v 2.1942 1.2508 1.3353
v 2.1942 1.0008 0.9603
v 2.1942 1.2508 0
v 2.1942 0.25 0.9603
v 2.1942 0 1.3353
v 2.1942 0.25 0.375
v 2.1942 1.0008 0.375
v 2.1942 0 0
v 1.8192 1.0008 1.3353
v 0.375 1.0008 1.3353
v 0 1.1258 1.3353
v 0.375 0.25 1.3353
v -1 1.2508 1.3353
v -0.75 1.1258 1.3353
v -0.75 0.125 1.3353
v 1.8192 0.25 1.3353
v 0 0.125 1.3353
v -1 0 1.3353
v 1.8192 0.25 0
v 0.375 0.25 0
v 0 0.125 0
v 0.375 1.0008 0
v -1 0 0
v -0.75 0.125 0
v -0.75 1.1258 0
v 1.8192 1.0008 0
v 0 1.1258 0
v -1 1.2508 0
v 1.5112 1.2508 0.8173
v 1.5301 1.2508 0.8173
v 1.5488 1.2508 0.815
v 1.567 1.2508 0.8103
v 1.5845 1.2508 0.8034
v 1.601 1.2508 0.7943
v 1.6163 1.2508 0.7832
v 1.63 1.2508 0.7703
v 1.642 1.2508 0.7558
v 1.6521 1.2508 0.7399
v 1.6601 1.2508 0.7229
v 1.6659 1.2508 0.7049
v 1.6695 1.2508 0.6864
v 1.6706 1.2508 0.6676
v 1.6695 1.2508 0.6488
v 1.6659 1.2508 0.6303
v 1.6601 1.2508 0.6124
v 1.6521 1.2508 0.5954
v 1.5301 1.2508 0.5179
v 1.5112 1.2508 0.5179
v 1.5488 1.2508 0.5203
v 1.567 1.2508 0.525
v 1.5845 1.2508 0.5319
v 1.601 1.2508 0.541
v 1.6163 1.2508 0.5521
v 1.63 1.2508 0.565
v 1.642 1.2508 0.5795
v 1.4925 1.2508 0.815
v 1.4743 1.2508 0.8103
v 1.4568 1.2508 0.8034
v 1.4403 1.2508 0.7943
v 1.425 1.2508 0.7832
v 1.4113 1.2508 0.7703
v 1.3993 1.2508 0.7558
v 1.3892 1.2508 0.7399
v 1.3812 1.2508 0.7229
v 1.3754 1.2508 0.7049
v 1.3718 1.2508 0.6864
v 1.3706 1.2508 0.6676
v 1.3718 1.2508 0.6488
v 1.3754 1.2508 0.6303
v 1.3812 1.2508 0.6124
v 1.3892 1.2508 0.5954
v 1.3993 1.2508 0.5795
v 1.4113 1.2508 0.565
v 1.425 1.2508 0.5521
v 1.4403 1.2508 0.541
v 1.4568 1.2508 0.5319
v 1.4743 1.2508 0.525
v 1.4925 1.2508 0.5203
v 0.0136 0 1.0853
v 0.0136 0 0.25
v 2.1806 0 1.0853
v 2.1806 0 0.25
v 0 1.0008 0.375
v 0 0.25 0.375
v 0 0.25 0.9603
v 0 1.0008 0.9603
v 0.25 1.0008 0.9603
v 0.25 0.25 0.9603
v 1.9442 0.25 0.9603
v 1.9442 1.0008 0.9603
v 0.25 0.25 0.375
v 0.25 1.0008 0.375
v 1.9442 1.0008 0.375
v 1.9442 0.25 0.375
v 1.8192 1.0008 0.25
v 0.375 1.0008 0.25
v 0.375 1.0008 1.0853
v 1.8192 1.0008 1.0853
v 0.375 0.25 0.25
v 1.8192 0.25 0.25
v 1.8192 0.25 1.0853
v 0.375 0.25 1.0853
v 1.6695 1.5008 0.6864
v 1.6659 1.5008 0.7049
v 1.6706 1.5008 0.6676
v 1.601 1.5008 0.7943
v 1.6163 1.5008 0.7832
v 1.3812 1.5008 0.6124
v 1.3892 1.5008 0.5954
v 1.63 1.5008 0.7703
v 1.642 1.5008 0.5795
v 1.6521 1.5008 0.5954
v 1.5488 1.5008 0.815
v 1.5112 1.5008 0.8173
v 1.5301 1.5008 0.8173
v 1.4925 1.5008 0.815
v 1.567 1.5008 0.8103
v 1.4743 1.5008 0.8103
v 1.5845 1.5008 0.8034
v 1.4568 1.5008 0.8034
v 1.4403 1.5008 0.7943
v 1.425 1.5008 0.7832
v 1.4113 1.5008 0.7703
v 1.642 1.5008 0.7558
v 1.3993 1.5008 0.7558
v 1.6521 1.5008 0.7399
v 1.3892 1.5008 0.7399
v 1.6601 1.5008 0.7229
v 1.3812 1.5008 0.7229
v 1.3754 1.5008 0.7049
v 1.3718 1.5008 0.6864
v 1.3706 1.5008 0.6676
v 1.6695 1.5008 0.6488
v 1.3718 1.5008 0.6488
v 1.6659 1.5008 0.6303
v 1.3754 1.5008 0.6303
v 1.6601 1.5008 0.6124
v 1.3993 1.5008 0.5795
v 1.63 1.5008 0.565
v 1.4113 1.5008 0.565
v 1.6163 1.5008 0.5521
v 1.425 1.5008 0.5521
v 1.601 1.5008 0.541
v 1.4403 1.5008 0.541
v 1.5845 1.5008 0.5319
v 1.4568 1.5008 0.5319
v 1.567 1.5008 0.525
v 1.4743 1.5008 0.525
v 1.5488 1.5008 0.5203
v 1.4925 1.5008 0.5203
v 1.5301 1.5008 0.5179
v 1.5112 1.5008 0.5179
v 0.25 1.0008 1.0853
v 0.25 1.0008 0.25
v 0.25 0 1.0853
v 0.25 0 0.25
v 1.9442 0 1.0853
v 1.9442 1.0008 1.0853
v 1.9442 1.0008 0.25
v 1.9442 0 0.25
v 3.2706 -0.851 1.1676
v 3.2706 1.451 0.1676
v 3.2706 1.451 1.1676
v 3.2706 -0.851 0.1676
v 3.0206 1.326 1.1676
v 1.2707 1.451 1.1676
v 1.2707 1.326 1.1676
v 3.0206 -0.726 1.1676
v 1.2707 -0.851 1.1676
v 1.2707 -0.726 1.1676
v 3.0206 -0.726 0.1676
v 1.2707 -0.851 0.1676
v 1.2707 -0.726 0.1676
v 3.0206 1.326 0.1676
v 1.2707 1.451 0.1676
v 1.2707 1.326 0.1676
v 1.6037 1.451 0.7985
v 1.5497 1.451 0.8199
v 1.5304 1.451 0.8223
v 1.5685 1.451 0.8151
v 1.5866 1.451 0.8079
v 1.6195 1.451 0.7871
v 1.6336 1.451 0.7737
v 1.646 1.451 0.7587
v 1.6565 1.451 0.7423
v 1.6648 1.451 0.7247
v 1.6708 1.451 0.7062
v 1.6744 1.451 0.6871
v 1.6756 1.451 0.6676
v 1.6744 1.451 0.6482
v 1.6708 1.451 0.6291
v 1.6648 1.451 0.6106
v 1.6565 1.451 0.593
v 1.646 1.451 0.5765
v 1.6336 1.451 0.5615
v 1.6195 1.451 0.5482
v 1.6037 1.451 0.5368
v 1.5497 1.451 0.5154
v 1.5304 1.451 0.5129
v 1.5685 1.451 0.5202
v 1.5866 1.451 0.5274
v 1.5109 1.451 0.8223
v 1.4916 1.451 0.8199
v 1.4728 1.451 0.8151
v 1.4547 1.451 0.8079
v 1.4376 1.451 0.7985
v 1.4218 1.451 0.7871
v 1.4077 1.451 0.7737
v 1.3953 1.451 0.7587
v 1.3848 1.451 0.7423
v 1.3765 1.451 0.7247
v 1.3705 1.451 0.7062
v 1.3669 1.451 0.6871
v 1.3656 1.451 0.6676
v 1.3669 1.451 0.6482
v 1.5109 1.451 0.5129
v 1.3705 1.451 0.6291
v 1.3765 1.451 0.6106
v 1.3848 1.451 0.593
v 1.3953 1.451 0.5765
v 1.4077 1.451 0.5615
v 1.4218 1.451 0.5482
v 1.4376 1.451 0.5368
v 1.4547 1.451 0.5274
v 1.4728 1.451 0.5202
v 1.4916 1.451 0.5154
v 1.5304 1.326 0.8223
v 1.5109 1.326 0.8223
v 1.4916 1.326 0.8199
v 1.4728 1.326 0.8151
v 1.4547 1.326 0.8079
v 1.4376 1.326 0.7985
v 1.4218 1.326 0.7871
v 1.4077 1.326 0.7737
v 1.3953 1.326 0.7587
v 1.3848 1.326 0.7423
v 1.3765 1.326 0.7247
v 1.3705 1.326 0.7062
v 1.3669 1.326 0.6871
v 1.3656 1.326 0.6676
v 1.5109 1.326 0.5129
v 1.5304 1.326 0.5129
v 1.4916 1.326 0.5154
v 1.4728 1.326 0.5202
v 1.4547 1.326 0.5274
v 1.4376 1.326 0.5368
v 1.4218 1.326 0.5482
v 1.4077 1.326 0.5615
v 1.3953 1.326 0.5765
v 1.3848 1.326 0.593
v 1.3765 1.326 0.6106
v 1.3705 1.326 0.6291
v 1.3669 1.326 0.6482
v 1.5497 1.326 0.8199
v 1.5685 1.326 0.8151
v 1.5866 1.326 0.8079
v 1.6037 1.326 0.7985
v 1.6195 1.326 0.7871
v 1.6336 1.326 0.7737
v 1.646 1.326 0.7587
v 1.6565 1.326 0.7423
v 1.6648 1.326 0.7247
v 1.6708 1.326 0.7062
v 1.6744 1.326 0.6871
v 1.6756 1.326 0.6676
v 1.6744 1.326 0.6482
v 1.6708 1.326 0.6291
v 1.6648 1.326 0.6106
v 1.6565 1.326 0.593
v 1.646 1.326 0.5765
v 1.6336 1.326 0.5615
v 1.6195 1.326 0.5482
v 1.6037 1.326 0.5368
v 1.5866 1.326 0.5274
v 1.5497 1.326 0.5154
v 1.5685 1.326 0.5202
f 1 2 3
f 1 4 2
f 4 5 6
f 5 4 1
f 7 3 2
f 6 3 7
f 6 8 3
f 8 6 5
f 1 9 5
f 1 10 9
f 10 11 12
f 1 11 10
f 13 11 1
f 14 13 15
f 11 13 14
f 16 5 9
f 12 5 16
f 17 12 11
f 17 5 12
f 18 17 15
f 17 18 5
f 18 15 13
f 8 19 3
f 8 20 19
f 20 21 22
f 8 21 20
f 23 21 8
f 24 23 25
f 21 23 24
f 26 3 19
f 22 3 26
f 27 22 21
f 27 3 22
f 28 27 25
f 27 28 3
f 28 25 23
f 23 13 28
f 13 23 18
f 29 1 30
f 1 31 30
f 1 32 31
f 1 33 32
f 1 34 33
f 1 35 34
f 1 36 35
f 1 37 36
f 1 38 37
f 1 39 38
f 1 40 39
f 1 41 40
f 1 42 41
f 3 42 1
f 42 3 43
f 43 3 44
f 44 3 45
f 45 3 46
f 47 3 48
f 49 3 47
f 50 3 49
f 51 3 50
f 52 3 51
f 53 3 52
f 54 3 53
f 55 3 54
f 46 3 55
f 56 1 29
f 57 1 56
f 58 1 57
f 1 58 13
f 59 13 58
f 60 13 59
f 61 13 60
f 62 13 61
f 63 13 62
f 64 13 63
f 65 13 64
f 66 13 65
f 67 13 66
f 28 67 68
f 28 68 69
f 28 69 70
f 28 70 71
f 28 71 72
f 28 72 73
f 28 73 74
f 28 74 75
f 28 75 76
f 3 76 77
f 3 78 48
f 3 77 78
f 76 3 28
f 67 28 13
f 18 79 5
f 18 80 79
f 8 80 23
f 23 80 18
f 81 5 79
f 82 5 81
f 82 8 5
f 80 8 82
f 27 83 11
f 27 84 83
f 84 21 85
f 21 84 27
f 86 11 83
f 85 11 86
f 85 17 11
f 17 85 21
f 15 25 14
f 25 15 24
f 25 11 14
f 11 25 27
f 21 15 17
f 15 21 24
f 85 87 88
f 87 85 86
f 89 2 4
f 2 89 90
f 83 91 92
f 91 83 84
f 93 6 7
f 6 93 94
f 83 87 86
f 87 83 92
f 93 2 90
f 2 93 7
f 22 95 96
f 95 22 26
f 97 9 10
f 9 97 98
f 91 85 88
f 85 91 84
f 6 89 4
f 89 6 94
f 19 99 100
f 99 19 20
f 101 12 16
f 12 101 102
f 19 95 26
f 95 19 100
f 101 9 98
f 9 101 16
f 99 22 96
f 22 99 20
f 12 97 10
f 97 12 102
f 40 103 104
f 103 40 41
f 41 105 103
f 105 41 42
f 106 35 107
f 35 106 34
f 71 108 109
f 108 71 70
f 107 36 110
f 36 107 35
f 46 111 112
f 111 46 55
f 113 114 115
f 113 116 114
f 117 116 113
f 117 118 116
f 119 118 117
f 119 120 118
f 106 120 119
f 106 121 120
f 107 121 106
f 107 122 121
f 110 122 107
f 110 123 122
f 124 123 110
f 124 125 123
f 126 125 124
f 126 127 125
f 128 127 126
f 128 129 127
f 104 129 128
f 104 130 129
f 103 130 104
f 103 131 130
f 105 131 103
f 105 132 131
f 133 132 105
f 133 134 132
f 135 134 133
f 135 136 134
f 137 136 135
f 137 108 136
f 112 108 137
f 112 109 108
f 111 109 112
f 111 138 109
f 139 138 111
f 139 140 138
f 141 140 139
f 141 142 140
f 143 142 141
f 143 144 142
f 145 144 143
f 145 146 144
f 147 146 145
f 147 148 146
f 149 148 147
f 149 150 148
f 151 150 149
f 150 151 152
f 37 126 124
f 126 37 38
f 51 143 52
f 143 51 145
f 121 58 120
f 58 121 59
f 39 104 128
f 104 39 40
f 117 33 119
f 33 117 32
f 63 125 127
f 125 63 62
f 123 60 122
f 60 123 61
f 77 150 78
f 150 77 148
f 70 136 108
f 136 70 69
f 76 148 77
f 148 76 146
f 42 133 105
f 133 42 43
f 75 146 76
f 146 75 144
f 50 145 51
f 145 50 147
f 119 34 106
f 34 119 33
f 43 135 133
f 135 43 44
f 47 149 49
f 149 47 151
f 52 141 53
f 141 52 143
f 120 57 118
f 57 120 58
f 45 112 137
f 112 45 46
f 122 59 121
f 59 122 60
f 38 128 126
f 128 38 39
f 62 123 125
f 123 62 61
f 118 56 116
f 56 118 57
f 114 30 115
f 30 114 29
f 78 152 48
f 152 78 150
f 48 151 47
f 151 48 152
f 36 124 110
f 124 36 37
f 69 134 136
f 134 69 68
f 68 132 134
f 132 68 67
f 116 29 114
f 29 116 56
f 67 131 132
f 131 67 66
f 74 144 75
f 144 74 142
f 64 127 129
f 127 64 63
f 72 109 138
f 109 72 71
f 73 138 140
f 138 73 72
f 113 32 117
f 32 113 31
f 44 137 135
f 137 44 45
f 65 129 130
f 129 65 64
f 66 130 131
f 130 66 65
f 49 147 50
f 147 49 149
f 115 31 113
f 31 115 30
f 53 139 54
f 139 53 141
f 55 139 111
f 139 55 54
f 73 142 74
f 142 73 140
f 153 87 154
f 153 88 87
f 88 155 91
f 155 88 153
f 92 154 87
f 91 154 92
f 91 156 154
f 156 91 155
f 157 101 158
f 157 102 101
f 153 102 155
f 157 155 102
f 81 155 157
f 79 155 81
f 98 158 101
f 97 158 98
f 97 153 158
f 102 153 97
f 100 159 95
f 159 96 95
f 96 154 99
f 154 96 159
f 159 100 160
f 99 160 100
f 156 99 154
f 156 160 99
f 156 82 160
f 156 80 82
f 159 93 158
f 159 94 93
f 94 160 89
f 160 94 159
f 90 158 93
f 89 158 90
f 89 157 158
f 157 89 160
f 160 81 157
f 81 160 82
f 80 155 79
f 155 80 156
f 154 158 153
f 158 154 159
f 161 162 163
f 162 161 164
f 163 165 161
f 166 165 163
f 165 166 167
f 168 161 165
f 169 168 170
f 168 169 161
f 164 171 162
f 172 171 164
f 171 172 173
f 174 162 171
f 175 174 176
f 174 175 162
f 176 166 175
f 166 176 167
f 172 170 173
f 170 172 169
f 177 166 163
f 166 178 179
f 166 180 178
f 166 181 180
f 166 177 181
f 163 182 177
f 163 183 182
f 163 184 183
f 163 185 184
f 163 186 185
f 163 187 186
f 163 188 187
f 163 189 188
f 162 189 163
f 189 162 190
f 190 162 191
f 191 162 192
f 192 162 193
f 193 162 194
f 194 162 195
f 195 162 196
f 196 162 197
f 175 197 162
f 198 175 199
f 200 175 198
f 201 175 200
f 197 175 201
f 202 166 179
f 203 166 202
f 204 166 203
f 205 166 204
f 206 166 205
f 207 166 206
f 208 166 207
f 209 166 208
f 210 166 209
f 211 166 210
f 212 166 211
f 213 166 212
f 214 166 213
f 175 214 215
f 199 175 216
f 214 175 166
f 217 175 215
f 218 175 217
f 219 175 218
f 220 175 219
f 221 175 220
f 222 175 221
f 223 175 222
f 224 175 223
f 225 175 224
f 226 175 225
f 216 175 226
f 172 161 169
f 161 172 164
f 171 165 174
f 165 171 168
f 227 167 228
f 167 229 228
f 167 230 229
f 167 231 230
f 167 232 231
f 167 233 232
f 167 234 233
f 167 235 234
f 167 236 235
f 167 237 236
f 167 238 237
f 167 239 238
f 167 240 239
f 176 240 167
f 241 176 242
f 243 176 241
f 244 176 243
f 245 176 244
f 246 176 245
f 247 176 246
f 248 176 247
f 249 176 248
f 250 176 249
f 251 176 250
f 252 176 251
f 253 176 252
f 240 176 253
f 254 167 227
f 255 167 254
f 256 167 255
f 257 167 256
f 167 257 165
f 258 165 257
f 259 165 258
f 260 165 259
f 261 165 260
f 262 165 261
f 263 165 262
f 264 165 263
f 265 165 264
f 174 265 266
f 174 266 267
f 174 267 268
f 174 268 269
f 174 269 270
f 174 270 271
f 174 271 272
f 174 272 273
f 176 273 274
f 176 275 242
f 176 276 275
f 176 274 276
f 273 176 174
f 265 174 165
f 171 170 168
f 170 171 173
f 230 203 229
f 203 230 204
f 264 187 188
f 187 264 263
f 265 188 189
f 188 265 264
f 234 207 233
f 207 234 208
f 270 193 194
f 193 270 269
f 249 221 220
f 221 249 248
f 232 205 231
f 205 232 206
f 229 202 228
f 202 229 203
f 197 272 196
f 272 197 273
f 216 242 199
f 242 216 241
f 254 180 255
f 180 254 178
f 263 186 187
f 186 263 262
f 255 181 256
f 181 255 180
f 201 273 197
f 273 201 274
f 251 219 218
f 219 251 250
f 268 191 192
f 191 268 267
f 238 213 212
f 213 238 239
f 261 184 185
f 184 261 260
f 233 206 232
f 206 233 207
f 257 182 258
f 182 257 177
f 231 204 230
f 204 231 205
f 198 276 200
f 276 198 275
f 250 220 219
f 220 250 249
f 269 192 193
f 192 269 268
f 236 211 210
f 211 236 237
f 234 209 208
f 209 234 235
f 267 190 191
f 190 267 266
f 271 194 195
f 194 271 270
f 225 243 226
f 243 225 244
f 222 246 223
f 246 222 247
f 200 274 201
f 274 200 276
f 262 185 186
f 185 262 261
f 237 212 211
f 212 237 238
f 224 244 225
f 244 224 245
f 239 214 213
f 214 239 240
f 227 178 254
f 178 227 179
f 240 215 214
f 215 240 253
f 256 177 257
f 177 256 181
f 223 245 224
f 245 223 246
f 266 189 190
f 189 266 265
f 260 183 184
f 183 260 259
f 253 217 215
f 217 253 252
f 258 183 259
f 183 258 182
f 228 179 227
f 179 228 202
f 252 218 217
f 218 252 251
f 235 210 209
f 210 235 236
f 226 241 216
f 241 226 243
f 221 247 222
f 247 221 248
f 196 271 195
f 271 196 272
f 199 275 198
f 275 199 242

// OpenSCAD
$fn = 50;

mm2in = 0.0394;
tolerance =1*mm2in;
servoWidth=20.2*mm2in + tolerance;
servoBottomLength=43*mm2in;
servoBottomHeight=24.4*mm2in + tolerance;
servoTopHeight=16.8*mm2in + tolerance;
servoTopLength=54*mm2in+tolerance;
servoHornLocation = servoBottomLength/4;
bracketThickness = 0.25;
bracketHeight = 1;
cylinderRadius = 0.15;

module shoulderServo(){
  rotate([0,0,180])
  translate([-servoBottomLength,0,0])
  union(){
  cube([servoBottomLength,servoBottomHeight,servoWidth]);
  translate([servoBottomLength/2,servoBottomHeight+servoTopHeight/2,servoWidth/2])
  cube([servoTopLength,servoTopHeight,servoWidth],center=true);
  }
}
module shoulderServoBracket(){
  union(){
    difference(){
      translate([-1,0,0])
      cube([servoBottomLength+2*bracketThickness+1,servoBottomHeight+bracketThickness,servoWidth+2*bracketThickness]);  
      translate([-1+bracketThickness,bracketThickness/2,0])
      cube([0.75,servoBottomHeight,2]);
      translate([-0.5,bracketThickness,1.5*bracketThickness])
      cube([2*servoBottomLength,servoBottomHeight-bracketThickness,servoWidth-bracketThickness]);
      translate([1.5*bracketThickness,bracketThickness,0])
      cube([servoBottomLength - bracketThickness,servoBottomHeight-bracketThickness,2*servoWidth]);
    }
    translate([servoBottomLength*3/4 + bracketThickness,servoBottomHeight + 2*bracketThickness,servoWidth/2 + bracketThickness])
    rotate([90,0,0])
    cylinder(r=cylinderRadius,h=bracketThickness);
  }
}
module shoulderArmBracket(){
  cylinderRadius = 0.15;
  bracketLength = servoBottomHeight+servoTopHeight + 2*bracketThickness+0.10;
  //bracketLength =  2;
  bracketWidth = 2; 

  difference(){
    cube([bracketWidth,bracketLength,bracketHeight]);
    translate([0,bracketThickness/2,0])
    cube([bracketWidth-bracketThickness,bracketLength-bracketThickness,bracketHeight]);
    translate([bracketThickness,bracketLength,bracketHeight/2])
    rotate([90,0,0])
    cylinder(r=cylinderRadius+0.005,h=bracketThickness,center=true);
  }
}
module shoulderBrackets(){
difference(){
  shoulderServoBracket();
  translate([bracketThickness,servoBottomHeight,bracketThickness])
  shoulderServo();
}
translate([servoBottomLength*3/4,-(servoBottomHeight+servoTopHeight)/2,servoWidth/2 +bracketThickness-bracketHeight/2 ])
shoulderArmBracket();
}
shoulderBrackets();
